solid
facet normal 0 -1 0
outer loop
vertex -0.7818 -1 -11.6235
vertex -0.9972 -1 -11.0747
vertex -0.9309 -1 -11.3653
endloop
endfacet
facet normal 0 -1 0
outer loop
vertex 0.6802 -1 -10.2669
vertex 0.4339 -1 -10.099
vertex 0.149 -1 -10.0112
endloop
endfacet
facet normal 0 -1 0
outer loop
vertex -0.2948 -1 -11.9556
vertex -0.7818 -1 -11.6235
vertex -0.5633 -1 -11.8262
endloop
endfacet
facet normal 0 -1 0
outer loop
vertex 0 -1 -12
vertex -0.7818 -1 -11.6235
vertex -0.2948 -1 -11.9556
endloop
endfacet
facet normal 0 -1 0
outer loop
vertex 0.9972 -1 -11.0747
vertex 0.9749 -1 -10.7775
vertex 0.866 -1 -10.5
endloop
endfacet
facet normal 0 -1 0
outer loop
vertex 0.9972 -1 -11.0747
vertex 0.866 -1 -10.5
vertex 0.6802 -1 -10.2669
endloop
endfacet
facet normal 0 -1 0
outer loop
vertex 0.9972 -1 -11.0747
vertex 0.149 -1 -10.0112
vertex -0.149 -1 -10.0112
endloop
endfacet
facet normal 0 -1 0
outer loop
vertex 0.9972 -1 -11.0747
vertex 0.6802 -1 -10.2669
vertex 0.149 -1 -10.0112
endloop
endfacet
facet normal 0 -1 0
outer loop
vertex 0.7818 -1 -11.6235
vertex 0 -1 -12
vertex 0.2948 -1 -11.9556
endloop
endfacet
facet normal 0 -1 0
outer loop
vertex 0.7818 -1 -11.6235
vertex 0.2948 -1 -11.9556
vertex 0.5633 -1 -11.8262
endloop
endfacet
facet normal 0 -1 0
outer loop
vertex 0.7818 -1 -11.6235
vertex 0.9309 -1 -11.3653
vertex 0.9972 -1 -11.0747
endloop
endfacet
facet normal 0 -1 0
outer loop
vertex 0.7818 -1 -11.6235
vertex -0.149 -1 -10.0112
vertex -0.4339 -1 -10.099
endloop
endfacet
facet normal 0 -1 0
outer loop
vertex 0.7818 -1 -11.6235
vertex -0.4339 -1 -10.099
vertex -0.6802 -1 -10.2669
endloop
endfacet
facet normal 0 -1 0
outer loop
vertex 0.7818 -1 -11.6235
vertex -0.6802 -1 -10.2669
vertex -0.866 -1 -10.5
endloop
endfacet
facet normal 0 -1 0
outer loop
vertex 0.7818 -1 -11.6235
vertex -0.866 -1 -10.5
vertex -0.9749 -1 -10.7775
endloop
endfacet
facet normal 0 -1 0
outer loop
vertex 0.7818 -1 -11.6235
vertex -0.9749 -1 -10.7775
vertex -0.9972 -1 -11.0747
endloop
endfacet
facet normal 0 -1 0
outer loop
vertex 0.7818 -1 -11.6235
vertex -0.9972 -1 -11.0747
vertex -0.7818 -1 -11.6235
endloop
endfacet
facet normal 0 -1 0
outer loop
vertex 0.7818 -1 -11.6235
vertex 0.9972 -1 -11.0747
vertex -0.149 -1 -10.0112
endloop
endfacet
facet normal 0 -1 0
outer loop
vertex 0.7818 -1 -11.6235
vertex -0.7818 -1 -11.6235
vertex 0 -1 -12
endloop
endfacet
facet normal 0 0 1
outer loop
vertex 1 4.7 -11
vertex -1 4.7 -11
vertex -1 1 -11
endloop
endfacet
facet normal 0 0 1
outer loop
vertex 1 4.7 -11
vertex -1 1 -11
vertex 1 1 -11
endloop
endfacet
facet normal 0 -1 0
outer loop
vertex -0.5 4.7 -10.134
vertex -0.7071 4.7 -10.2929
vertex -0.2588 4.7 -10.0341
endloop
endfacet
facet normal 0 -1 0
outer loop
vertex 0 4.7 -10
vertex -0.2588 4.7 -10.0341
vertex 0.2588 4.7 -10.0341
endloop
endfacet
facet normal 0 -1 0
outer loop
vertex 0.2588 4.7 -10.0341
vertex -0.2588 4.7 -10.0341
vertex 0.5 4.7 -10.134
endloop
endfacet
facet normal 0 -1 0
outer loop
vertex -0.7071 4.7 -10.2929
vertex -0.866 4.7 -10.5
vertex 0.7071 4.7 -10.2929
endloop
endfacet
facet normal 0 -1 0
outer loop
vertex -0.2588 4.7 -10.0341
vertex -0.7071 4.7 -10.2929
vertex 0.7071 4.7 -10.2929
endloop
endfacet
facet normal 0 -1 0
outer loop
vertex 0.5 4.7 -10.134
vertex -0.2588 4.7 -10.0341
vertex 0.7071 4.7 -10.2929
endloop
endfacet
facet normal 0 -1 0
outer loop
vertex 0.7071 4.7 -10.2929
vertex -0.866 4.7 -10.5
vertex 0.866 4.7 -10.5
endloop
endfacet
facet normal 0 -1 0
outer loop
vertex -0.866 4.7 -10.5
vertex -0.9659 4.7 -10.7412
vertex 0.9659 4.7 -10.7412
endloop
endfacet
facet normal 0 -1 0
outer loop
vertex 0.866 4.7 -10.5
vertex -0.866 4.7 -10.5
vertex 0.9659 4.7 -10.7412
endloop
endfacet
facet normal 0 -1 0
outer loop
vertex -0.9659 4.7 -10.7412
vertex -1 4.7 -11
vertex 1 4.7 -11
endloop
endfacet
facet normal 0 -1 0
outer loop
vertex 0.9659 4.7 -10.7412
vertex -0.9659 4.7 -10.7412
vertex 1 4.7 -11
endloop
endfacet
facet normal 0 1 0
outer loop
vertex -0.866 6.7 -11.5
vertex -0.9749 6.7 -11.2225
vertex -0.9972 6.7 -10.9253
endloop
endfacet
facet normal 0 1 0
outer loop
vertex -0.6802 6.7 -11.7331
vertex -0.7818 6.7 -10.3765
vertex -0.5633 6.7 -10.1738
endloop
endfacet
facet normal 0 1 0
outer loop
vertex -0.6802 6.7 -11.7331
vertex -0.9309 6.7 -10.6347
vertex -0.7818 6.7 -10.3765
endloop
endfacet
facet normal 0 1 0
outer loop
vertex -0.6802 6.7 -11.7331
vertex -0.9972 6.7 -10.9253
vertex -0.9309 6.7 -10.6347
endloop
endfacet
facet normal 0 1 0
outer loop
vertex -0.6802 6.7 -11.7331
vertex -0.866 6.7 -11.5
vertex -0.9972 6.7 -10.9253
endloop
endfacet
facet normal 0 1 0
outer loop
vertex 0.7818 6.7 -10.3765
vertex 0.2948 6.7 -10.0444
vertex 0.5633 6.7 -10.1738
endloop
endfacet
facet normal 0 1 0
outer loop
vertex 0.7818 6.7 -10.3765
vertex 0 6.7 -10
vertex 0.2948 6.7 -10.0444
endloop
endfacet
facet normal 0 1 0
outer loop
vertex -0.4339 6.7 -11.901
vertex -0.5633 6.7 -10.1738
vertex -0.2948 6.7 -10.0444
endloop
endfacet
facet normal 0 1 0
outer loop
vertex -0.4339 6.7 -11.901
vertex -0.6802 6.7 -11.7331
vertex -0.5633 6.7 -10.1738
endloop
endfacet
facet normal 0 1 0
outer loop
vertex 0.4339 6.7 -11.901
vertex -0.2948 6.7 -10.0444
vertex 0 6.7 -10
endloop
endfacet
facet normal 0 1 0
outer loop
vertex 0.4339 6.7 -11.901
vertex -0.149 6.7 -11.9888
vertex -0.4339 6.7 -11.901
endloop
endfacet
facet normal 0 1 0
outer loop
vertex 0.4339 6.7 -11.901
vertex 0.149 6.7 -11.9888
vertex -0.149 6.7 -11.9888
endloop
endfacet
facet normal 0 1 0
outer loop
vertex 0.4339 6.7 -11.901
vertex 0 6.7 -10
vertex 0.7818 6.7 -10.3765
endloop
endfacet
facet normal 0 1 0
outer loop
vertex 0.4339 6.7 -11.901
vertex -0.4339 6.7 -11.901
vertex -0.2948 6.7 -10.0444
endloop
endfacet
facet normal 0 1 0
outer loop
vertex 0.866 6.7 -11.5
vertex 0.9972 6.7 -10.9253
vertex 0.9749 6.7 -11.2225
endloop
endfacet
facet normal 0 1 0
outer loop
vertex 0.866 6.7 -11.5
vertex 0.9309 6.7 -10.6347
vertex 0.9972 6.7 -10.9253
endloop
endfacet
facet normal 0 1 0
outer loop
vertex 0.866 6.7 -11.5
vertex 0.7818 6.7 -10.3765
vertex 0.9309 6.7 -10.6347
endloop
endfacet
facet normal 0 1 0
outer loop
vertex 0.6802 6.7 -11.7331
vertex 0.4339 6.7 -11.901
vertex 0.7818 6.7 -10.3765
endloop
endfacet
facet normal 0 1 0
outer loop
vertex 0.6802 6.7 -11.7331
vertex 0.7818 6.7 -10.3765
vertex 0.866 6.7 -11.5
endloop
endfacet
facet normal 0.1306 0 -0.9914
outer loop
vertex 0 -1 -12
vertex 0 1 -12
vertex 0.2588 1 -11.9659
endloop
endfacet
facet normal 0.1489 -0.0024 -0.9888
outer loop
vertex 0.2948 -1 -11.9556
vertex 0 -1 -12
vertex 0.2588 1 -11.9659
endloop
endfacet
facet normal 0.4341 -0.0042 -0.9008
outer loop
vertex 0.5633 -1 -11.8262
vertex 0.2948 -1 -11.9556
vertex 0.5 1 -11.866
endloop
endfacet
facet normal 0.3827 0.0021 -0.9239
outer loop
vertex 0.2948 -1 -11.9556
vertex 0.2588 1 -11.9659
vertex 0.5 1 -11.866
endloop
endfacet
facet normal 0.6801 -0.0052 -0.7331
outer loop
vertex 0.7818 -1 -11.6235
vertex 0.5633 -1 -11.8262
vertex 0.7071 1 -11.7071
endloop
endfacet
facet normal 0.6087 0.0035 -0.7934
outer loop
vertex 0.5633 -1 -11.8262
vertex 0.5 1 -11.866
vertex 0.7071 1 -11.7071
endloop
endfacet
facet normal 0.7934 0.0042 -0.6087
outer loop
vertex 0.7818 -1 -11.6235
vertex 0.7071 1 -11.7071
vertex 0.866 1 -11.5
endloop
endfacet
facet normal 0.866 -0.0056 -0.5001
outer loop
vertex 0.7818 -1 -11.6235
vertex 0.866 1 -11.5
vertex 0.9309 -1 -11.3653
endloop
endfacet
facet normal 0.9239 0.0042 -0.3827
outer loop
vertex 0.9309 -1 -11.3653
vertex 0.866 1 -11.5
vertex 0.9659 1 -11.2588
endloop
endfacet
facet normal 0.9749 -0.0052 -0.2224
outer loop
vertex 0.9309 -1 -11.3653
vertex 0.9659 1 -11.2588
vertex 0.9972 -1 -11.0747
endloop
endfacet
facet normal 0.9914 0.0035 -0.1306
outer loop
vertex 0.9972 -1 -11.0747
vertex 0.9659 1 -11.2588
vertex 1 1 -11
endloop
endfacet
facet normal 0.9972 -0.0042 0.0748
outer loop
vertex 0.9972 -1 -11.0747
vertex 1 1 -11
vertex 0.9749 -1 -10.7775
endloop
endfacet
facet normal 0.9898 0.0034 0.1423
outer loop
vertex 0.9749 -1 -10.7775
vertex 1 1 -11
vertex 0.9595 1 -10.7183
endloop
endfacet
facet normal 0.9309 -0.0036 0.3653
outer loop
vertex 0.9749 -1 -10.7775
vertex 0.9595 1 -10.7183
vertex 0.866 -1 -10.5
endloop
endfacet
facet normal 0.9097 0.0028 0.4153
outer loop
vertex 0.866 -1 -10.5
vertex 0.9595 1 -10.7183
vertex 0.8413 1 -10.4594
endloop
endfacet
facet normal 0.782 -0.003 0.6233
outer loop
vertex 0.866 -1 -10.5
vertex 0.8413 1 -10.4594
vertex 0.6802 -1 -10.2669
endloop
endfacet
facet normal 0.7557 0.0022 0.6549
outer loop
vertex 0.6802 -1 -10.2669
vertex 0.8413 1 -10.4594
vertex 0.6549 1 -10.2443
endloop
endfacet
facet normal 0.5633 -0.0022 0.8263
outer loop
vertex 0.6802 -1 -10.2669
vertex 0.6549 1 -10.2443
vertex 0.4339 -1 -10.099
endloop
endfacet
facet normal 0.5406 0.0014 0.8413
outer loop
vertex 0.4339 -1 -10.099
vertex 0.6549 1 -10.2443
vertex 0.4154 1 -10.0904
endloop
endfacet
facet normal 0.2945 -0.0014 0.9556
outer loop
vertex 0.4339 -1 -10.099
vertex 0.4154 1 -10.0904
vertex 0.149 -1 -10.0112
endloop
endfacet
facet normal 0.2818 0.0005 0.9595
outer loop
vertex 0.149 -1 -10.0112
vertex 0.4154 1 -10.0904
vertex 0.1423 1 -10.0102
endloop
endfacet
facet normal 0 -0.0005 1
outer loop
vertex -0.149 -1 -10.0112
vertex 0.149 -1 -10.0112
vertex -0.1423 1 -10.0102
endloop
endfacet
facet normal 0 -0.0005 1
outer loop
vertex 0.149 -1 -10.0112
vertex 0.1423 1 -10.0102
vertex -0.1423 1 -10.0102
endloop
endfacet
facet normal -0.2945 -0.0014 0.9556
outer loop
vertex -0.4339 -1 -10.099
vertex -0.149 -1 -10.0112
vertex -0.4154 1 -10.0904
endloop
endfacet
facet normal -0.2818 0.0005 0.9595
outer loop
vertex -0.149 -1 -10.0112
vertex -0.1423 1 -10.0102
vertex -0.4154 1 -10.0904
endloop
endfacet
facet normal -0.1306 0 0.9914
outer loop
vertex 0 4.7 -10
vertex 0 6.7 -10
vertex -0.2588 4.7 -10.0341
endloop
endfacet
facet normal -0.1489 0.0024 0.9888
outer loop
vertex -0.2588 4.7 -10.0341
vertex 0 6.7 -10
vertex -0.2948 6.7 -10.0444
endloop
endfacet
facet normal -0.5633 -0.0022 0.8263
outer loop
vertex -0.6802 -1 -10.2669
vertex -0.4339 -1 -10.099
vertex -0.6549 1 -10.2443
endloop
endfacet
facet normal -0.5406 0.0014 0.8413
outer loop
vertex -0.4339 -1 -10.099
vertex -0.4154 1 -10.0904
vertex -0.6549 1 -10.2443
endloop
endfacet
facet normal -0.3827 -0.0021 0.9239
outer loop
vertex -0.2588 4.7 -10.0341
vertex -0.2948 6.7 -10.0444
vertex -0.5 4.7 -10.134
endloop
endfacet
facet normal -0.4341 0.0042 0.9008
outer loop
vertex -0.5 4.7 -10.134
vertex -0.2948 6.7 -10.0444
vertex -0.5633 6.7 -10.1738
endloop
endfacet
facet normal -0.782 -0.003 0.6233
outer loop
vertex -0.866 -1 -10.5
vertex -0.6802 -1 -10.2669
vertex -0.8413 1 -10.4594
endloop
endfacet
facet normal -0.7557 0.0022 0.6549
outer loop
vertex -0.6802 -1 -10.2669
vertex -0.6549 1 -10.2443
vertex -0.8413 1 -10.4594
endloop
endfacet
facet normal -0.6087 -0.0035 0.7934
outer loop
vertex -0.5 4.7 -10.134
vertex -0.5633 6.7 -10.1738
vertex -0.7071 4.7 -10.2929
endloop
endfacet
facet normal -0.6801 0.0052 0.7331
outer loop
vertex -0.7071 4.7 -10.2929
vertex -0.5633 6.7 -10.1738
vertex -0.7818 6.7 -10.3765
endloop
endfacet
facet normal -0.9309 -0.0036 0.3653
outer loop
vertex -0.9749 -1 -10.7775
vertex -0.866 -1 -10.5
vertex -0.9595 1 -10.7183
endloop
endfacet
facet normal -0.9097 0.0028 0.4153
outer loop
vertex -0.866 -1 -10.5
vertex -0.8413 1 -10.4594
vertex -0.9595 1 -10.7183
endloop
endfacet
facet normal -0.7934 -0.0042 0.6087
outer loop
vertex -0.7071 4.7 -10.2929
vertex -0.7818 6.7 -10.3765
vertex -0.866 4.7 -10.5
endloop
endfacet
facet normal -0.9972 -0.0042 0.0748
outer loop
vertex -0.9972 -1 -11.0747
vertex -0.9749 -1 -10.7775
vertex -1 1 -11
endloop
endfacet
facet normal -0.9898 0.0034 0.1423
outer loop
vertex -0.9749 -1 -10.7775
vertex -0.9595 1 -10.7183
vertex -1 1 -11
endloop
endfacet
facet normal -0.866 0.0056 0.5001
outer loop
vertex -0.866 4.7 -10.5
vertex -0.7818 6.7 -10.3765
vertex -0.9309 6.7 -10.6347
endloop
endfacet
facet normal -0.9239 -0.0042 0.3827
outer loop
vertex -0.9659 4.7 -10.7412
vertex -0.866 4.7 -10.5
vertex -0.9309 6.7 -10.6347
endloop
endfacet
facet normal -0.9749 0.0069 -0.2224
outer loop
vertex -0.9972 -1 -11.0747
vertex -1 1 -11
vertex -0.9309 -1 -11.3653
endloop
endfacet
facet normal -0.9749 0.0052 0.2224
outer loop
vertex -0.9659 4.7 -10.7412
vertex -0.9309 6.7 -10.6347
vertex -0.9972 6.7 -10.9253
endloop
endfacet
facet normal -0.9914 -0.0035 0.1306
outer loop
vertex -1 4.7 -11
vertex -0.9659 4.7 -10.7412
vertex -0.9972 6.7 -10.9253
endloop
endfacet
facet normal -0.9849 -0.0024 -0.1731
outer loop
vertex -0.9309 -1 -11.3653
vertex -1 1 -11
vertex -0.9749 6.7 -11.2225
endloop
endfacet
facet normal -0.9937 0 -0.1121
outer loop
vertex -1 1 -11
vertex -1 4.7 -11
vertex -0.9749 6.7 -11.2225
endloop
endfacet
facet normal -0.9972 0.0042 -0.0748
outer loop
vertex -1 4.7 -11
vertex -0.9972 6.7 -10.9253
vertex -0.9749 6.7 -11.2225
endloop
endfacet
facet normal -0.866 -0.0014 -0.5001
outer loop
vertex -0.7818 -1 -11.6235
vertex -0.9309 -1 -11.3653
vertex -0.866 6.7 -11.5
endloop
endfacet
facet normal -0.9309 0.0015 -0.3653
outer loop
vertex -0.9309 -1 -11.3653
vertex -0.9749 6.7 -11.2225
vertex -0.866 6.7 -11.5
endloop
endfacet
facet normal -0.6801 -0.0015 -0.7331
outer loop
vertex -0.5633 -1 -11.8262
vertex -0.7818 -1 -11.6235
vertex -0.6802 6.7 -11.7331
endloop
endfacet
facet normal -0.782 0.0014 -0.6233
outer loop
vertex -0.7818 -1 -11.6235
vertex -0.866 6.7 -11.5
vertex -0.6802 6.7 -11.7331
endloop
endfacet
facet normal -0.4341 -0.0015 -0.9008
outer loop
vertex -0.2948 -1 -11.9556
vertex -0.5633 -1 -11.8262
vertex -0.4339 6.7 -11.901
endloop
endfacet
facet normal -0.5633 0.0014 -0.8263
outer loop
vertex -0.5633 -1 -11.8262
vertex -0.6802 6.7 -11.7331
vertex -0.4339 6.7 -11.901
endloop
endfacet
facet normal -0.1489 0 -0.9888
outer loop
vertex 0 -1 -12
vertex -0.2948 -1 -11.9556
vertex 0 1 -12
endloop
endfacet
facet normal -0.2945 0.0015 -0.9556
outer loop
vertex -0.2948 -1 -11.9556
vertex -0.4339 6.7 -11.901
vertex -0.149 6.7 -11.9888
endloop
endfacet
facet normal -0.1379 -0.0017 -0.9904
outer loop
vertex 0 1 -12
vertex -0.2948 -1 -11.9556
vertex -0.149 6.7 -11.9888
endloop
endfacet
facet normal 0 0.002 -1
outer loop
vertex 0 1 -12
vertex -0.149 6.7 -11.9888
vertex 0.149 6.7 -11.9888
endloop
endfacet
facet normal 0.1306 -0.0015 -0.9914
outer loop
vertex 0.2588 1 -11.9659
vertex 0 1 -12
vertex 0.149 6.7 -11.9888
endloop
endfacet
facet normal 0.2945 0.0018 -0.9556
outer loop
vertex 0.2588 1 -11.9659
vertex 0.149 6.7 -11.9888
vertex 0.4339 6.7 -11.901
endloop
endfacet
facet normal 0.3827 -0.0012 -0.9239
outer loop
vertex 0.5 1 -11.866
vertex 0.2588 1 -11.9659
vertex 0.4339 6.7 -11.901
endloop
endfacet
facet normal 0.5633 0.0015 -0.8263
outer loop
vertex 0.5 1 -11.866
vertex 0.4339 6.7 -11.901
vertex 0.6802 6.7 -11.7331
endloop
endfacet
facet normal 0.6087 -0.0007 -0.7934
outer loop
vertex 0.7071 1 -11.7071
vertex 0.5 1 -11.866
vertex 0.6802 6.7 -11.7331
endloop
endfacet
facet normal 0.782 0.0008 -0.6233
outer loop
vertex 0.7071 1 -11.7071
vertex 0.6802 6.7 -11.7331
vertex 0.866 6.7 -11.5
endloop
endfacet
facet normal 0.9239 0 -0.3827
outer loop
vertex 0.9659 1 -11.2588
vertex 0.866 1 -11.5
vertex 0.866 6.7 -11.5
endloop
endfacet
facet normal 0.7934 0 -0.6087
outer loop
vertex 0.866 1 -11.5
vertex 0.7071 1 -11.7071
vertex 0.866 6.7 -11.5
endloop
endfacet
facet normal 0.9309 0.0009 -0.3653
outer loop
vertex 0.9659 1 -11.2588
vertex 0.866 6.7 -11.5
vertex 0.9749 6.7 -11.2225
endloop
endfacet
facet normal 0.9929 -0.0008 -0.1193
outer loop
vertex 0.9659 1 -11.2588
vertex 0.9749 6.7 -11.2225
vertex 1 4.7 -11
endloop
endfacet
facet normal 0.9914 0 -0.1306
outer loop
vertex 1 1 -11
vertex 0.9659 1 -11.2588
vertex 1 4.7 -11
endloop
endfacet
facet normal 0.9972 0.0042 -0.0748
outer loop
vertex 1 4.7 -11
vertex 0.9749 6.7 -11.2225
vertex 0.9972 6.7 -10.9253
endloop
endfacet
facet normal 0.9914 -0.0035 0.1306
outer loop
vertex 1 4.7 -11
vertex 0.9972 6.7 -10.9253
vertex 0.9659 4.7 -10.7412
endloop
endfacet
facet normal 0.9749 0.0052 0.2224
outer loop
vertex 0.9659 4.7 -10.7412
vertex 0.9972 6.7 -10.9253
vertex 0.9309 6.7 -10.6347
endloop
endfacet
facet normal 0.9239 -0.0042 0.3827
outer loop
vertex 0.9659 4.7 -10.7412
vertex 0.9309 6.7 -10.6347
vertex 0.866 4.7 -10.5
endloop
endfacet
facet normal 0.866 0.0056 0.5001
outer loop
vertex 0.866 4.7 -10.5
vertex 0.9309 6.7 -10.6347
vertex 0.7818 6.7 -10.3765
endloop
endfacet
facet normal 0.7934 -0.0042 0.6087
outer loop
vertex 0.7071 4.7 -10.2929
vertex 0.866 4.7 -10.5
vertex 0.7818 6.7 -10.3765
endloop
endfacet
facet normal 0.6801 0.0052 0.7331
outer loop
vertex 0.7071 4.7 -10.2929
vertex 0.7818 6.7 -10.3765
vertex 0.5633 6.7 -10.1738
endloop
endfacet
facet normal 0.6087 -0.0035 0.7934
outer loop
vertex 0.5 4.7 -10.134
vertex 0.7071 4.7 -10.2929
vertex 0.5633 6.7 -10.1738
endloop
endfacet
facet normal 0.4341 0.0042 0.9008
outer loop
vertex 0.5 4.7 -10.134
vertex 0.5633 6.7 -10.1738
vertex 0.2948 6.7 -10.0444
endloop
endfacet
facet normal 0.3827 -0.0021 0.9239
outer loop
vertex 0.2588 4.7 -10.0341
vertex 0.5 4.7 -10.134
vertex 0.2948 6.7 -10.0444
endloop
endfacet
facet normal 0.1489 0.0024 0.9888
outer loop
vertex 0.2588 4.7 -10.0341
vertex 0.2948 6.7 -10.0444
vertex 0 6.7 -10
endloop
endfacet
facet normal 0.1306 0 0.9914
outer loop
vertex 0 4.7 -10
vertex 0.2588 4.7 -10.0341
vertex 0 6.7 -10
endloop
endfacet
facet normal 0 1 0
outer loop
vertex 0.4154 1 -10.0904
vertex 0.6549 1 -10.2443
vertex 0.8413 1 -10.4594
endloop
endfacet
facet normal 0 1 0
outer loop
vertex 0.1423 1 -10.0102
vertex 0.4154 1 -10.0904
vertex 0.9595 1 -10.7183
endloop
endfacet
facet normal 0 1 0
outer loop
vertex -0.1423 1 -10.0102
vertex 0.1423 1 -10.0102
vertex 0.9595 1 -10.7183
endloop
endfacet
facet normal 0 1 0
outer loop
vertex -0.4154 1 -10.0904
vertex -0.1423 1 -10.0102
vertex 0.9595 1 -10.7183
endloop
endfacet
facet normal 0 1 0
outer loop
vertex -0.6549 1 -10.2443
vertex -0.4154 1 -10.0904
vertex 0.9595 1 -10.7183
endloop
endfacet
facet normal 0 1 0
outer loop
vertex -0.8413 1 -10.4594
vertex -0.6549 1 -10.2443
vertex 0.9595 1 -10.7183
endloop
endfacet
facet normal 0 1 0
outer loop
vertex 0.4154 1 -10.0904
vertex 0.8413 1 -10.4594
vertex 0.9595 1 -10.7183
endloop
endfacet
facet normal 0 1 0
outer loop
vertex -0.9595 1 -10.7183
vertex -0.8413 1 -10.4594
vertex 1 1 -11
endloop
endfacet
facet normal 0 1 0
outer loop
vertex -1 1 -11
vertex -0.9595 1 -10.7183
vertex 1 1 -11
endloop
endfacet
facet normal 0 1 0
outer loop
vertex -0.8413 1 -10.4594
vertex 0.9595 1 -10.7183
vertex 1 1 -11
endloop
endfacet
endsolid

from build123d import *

# Parameters (mm, degrees)
SKETCH1_R           = 13
BOSS_EXTRUDE1_DEPTH = 1
SKETCH16_R          = 13
BOSS_EXTRUDE3_DEPTH = 1
SKETCH19_R          = 1
BOSS_EXTRUDE4_DEPTH = 29.8
SKETCH18_W          = 22
SKETCH18_H          = 22
CUT_EXTRUDE6_DEPTH  = 3.7
SKETCH21_R          = 11
CUT_EXTRUDE7_DEPTH  = 3.7
SKETCH22_R          = 11
CUT_EXTRUDE8_DEPTH  = 3.7
SKETCH23_R          = 11
CUT_EXTRUDE9_DEPTH  = 3.7
SKETCH24_R          = 19.921792127
CUT_EXTRUDE10_DEPTH = 1
SKETCH25_R          = 36.182885583
CUT_EXTRUDE11_DEPTH = 1
BOSS_EXTRUDE5_START = 2
BOSS_EXTRUDE5_DEPTH = 2
SKETCH27_R          = 1
BOSS_EXTRUDE6_DEPTH = 2
SKETCH28_R          = 15.857434306
CUT_EXTRUDE12_DEPTH = 26.1


with BuildPart() as part:
    # Sketch1 → Boss-Extrude1 (new body)
    with BuildSketch(Plane(origin=(0, 0, 0), x_dir=(1, 0, 0), z_dir=(0, 1, 0))):
        with Locations(Location((0, 0, 0), (0, 0, 270))):
            Circle(SKETCH1_R)
    extrude(amount=BOSS_EXTRUDE1_DEPTH)



with BuildPart() as body_2:
    # Sketch16 → Boss-Extrude3 (new body)
    with BuildSketch(Plane(origin=(0, 30.8, 0), x_dir=(1, 0, 0), z_dir=(0, 1, 0))):
        with Locations(Location((0, 0, 0), (0, 0, 270))):
            Circle(SKETCH16_R)
    extrude(amount=BOSS_EXTRUDE3_DEPTH)


with BuildPart() as part_1:
    add(part.part)

    add(body_2.part)  # Boss-Extrude4 merges body 2
    # Sketch19 → Boss-Extrude4 (add)
    with BuildSketch(Plane(origin=(0, 1, 0), x_dir=(1, 0, 0), z_dir=(0, 1, 0))):
        with Locations(Location((0, 11, 0), (0, 0, 270))):
            Circle(SKETCH19_R)
    extrude(amount=BOSS_EXTRUDE4_DEPTH)

    # Sketch18 → Cut-Extrude6 (cut)
    with BuildSketch(Plane(origin=(0, 4.7, 0), x_dir=(1, 0, 0), z_dir=(0, 1, 0))):
        Rectangle(SKETCH18_W, SKETCH18_H)
    extrude(amount=-CUT_EXTRUDE6_DEPTH, mode=Mode.SUBTRACT)

    # Sketch21 → Cut-Extrude7 (cut)
    with BuildSketch(Plane(origin=(0, 13.4, 0), x_dir=(1, 0, 0), z_dir=(0, 1, 0))):
        Circle(SKETCH21_R)
    extrude(amount=-CUT_EXTRUDE7_DEPTH, mode=Mode.SUBTRACT)

    # Sketch22 → Cut-Extrude8 (cut)
    with BuildSketch(Plane(origin=(0, 22.1, 0), x_dir=(1, 0, 0), z_dir=(0, 1, 0))):
        Circle(SKETCH22_R)
    extrude(amount=-CUT_EXTRUDE8_DEPTH, mode=Mode.SUBTRACT)

    # Sketch23 → Cut-Extrude9 (cut)
    with BuildSketch(Plane(origin=(0, 30.8, 0), x_dir=(1, 0, 0), z_dir=(0, 1, 0))):
        Circle(SKETCH23_R)
    extrude(amount=-CUT_EXTRUDE9_DEPTH, mode=Mode.SUBTRACT)

    # Sketch24 → Cut-Extrude10 (cut)
    with BuildSketch(Plane(origin=(0, 31.8, 0), x_dir=(1, 0, 0), z_dir=(0, 1, 0))):
        Circle(SKETCH24_R)
    extrude(amount=-CUT_EXTRUDE10_DEPTH, mode=Mode.SUBTRACT)

    # Sketch25 → Cut-Extrude11 (cut)
    with BuildSketch(Plane(origin=(0, 1, 0), x_dir=(1, 0, 0), z_dir=(0, 1, 0))):
        Circle(SKETCH25_R)
    extrude(amount=-CUT_EXTRUDE11_DEPTH, mode=Mode.SUBTRACT)

    # Sketch26 → Boss-Extrude5 (add)
    with BuildSketch(Plane(origin=(0, 30.8, 0), x_dir=(1, 0, 0), z_dir=(0, 1, 0)).offset(BOSS_EXTRUDE5_START)):
        with BuildLine():
            ThreePointArc((-0.998966408, 10.954545455), (0, 11), (0.998966408, 10.954545455))
            ThreePointArc((0.998966408, 10.954545455), (0, 12), (-0.998966408, 10.954545455))
        make_face()
        with BuildLine():
            ThreePointArc((0.998966408, 10.954545455), (0.999741569, 10.977266852), (1, 11))
            ThreePointArc((1, 11), (-0.022733148, 11.999741569), (-0.998966408, 10.954545455))
            ThreePointArc((-0.998966408, 10.954545455), (0, 11), (0.998966408, 10.954545455))
        make_face()
        with BuildLine():
            ThreePointArc((0.998966408, 10.954545455), (0, 11), (-0.998966408, 10.954545455))
            ThreePointArc((-0.998966408, 10.954545455), (0, 10), (0.998966408, 10.954545455))
        make_face()
    extrude(amount=-BOSS_EXTRUDE5_DEPTH)

    # Sketch27 → Boss-Extrude6 (add)
    with BuildSketch(Plane.XZ.offset(-1)):
        with Locations(Location((0, -11, 0), (0, 0, 270))):
            Circle(SKETCH27_R)
    extrude(amount=BOSS_EXTRUDE6_DEPTH)

    # Sketch28 → Cut-Extrude12 (cut)
    with BuildSketch(Plane(origin=(0, 32.8, 0), x_dir=(1, 0, 0), z_dir=(0, 1, 0))):
        with Locations((-0.375221001, 0)):
            Circle(SKETCH28_R)
    extrude(amount=-CUT_EXTRUDE12_DEPTH, mode=Mode.SUBTRACT)


solid = part_1.part
